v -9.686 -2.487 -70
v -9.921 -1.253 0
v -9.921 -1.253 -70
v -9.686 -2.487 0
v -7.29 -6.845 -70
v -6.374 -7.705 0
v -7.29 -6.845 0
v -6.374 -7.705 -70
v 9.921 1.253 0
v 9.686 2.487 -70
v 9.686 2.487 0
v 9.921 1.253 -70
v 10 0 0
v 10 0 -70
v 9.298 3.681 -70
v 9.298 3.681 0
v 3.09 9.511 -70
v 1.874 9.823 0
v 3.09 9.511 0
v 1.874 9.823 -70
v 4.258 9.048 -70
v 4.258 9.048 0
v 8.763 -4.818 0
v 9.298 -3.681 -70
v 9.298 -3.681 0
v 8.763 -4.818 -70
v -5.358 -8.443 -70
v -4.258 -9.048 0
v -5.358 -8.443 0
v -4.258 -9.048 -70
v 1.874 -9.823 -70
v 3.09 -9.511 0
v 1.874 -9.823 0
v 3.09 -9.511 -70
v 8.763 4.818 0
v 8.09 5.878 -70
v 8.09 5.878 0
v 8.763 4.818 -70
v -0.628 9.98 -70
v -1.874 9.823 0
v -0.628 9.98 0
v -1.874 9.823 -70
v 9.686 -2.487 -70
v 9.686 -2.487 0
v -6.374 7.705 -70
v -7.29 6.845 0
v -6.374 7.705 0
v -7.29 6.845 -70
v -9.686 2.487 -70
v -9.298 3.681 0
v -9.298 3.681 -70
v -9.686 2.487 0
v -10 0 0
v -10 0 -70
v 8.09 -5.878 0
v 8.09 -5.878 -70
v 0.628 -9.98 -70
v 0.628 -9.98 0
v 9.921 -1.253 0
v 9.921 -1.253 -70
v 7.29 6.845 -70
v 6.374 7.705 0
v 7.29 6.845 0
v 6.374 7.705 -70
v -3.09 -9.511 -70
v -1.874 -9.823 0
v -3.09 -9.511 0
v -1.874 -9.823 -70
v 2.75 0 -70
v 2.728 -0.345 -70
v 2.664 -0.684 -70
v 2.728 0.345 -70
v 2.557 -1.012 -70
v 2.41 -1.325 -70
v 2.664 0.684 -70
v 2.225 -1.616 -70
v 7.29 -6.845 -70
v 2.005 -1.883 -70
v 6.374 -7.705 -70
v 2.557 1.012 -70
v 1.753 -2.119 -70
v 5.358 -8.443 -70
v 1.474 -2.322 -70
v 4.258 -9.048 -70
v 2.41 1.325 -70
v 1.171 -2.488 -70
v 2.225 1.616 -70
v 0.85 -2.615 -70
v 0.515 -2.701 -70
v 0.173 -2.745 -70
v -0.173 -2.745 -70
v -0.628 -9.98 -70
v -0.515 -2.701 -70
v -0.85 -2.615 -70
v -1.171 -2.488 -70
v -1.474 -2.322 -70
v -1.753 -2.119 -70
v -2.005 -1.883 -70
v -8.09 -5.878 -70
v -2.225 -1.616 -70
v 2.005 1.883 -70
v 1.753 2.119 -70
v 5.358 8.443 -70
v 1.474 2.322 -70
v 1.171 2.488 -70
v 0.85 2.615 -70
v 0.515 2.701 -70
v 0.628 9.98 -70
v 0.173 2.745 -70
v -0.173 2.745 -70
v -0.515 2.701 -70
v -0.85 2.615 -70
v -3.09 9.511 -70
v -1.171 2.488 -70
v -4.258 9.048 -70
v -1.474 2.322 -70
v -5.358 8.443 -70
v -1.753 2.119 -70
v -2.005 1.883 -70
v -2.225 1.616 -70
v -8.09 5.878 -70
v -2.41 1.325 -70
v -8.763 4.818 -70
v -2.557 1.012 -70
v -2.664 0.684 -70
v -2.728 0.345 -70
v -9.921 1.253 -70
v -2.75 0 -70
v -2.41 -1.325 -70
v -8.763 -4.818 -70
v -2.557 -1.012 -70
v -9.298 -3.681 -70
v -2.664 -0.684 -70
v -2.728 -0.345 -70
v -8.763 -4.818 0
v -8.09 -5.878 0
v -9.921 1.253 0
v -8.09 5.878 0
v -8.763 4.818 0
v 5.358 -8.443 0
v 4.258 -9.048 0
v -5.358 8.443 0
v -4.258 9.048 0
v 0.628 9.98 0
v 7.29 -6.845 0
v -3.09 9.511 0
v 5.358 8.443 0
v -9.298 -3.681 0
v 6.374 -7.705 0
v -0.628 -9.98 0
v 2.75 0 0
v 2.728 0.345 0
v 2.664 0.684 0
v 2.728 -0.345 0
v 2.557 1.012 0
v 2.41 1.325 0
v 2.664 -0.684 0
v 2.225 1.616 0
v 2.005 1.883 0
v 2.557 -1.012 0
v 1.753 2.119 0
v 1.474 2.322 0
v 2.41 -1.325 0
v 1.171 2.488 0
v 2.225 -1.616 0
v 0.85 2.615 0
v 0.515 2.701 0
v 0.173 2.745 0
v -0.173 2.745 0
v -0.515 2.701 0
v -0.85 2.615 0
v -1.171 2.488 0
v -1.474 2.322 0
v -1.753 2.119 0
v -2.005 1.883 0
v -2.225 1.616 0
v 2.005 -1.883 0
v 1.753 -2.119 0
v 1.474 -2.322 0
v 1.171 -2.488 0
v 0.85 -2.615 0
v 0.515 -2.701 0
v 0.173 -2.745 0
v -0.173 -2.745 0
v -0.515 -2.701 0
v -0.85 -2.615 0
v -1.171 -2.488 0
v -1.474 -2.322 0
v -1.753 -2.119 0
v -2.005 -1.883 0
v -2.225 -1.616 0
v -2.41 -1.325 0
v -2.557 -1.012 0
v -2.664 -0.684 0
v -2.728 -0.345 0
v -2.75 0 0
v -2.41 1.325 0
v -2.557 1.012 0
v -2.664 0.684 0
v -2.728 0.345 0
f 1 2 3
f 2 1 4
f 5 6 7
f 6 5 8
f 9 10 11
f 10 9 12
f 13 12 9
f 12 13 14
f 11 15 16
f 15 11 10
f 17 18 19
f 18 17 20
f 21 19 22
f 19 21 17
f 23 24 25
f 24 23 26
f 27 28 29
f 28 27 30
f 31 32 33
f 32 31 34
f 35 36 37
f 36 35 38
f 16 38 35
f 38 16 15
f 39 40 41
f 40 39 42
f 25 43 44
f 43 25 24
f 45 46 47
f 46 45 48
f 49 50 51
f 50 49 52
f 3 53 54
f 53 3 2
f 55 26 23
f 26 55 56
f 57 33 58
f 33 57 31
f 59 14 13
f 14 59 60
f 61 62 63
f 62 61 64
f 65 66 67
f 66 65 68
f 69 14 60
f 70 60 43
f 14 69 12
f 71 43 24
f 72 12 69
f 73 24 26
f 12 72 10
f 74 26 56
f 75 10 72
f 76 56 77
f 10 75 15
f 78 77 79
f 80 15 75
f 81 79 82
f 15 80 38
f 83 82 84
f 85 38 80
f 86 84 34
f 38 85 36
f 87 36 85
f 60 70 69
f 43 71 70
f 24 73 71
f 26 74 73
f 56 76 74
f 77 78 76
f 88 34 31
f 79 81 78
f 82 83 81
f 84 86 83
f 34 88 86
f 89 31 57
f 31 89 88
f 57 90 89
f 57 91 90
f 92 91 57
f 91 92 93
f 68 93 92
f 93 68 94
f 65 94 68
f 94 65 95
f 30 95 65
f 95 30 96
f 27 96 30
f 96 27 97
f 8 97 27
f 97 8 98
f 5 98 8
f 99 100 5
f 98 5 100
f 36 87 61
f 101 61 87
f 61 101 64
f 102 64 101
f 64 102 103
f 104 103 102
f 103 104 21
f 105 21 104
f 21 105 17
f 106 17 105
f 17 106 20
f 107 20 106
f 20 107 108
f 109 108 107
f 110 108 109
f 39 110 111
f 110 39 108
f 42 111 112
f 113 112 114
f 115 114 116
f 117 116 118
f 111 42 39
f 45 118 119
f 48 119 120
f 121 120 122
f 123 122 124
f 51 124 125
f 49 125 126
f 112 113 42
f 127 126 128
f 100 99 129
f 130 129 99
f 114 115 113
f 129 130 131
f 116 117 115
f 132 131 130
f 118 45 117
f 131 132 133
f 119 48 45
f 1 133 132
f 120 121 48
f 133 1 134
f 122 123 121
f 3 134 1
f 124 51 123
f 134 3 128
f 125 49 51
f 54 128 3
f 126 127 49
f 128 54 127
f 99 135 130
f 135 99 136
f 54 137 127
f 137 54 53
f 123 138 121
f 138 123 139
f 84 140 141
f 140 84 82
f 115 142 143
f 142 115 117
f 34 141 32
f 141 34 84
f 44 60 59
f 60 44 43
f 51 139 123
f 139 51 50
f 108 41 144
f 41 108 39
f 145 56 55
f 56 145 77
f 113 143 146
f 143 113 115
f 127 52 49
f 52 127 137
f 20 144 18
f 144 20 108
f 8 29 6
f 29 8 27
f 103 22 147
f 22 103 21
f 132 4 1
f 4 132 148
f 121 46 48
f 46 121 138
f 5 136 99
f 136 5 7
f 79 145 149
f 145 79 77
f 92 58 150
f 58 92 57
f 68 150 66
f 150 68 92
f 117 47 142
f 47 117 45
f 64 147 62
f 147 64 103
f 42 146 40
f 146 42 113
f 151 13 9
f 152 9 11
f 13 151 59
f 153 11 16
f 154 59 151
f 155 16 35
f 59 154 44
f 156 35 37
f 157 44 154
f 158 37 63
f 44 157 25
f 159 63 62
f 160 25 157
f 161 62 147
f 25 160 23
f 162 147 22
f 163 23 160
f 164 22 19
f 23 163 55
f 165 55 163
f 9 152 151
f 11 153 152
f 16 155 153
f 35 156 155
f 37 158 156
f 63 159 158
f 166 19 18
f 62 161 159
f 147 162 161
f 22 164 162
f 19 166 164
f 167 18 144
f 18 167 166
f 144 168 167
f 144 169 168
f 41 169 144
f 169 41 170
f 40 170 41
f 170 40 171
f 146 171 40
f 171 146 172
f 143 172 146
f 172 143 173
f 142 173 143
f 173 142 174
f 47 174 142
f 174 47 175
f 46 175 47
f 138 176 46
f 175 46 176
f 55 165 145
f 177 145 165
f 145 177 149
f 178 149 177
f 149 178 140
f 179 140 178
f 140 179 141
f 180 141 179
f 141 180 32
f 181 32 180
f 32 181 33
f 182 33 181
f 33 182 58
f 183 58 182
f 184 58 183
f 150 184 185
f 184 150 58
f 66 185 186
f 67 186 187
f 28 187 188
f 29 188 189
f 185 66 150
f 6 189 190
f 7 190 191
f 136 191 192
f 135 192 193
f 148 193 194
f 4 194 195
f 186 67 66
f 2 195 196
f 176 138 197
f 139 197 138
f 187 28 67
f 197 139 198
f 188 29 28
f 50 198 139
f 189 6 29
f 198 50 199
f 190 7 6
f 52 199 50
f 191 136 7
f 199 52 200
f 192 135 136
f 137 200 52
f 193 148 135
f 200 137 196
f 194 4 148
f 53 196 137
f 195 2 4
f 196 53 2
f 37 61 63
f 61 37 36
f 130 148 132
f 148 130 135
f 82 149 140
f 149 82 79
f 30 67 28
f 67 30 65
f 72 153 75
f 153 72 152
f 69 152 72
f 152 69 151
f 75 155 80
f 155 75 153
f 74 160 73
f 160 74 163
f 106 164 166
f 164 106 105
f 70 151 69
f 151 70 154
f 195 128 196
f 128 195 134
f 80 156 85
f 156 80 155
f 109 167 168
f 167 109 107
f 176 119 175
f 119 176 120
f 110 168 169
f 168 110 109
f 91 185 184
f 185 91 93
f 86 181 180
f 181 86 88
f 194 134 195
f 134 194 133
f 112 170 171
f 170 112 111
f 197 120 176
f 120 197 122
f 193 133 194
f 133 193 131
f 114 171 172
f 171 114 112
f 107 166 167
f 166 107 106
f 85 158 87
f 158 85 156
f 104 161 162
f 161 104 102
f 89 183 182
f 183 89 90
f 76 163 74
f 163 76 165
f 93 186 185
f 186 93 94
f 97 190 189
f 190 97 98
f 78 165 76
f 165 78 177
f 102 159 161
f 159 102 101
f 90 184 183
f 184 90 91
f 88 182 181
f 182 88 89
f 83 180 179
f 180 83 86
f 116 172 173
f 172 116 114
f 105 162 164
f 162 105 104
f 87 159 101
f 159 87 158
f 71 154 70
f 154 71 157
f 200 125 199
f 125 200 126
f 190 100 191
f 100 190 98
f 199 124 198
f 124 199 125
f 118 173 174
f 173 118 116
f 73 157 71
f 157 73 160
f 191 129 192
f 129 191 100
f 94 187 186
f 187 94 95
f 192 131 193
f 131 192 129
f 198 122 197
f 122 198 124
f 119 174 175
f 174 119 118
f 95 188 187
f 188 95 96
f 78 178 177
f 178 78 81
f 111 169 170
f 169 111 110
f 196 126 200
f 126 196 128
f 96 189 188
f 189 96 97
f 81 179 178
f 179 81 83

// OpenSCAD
$fn = 50;


difference() {
	union() {
		translate(v = [0, 0, -70.0000000000]) {
			cylinder(h = 70, r = 10.0000000000);
		}
		cylinder(h = 0, r = 20.0000000000);
	}
	union() {
		#translate(v = [0, 0, -70]) {
			cylinder(h = 70, r = 2.7500000000);
		}
	}
}
